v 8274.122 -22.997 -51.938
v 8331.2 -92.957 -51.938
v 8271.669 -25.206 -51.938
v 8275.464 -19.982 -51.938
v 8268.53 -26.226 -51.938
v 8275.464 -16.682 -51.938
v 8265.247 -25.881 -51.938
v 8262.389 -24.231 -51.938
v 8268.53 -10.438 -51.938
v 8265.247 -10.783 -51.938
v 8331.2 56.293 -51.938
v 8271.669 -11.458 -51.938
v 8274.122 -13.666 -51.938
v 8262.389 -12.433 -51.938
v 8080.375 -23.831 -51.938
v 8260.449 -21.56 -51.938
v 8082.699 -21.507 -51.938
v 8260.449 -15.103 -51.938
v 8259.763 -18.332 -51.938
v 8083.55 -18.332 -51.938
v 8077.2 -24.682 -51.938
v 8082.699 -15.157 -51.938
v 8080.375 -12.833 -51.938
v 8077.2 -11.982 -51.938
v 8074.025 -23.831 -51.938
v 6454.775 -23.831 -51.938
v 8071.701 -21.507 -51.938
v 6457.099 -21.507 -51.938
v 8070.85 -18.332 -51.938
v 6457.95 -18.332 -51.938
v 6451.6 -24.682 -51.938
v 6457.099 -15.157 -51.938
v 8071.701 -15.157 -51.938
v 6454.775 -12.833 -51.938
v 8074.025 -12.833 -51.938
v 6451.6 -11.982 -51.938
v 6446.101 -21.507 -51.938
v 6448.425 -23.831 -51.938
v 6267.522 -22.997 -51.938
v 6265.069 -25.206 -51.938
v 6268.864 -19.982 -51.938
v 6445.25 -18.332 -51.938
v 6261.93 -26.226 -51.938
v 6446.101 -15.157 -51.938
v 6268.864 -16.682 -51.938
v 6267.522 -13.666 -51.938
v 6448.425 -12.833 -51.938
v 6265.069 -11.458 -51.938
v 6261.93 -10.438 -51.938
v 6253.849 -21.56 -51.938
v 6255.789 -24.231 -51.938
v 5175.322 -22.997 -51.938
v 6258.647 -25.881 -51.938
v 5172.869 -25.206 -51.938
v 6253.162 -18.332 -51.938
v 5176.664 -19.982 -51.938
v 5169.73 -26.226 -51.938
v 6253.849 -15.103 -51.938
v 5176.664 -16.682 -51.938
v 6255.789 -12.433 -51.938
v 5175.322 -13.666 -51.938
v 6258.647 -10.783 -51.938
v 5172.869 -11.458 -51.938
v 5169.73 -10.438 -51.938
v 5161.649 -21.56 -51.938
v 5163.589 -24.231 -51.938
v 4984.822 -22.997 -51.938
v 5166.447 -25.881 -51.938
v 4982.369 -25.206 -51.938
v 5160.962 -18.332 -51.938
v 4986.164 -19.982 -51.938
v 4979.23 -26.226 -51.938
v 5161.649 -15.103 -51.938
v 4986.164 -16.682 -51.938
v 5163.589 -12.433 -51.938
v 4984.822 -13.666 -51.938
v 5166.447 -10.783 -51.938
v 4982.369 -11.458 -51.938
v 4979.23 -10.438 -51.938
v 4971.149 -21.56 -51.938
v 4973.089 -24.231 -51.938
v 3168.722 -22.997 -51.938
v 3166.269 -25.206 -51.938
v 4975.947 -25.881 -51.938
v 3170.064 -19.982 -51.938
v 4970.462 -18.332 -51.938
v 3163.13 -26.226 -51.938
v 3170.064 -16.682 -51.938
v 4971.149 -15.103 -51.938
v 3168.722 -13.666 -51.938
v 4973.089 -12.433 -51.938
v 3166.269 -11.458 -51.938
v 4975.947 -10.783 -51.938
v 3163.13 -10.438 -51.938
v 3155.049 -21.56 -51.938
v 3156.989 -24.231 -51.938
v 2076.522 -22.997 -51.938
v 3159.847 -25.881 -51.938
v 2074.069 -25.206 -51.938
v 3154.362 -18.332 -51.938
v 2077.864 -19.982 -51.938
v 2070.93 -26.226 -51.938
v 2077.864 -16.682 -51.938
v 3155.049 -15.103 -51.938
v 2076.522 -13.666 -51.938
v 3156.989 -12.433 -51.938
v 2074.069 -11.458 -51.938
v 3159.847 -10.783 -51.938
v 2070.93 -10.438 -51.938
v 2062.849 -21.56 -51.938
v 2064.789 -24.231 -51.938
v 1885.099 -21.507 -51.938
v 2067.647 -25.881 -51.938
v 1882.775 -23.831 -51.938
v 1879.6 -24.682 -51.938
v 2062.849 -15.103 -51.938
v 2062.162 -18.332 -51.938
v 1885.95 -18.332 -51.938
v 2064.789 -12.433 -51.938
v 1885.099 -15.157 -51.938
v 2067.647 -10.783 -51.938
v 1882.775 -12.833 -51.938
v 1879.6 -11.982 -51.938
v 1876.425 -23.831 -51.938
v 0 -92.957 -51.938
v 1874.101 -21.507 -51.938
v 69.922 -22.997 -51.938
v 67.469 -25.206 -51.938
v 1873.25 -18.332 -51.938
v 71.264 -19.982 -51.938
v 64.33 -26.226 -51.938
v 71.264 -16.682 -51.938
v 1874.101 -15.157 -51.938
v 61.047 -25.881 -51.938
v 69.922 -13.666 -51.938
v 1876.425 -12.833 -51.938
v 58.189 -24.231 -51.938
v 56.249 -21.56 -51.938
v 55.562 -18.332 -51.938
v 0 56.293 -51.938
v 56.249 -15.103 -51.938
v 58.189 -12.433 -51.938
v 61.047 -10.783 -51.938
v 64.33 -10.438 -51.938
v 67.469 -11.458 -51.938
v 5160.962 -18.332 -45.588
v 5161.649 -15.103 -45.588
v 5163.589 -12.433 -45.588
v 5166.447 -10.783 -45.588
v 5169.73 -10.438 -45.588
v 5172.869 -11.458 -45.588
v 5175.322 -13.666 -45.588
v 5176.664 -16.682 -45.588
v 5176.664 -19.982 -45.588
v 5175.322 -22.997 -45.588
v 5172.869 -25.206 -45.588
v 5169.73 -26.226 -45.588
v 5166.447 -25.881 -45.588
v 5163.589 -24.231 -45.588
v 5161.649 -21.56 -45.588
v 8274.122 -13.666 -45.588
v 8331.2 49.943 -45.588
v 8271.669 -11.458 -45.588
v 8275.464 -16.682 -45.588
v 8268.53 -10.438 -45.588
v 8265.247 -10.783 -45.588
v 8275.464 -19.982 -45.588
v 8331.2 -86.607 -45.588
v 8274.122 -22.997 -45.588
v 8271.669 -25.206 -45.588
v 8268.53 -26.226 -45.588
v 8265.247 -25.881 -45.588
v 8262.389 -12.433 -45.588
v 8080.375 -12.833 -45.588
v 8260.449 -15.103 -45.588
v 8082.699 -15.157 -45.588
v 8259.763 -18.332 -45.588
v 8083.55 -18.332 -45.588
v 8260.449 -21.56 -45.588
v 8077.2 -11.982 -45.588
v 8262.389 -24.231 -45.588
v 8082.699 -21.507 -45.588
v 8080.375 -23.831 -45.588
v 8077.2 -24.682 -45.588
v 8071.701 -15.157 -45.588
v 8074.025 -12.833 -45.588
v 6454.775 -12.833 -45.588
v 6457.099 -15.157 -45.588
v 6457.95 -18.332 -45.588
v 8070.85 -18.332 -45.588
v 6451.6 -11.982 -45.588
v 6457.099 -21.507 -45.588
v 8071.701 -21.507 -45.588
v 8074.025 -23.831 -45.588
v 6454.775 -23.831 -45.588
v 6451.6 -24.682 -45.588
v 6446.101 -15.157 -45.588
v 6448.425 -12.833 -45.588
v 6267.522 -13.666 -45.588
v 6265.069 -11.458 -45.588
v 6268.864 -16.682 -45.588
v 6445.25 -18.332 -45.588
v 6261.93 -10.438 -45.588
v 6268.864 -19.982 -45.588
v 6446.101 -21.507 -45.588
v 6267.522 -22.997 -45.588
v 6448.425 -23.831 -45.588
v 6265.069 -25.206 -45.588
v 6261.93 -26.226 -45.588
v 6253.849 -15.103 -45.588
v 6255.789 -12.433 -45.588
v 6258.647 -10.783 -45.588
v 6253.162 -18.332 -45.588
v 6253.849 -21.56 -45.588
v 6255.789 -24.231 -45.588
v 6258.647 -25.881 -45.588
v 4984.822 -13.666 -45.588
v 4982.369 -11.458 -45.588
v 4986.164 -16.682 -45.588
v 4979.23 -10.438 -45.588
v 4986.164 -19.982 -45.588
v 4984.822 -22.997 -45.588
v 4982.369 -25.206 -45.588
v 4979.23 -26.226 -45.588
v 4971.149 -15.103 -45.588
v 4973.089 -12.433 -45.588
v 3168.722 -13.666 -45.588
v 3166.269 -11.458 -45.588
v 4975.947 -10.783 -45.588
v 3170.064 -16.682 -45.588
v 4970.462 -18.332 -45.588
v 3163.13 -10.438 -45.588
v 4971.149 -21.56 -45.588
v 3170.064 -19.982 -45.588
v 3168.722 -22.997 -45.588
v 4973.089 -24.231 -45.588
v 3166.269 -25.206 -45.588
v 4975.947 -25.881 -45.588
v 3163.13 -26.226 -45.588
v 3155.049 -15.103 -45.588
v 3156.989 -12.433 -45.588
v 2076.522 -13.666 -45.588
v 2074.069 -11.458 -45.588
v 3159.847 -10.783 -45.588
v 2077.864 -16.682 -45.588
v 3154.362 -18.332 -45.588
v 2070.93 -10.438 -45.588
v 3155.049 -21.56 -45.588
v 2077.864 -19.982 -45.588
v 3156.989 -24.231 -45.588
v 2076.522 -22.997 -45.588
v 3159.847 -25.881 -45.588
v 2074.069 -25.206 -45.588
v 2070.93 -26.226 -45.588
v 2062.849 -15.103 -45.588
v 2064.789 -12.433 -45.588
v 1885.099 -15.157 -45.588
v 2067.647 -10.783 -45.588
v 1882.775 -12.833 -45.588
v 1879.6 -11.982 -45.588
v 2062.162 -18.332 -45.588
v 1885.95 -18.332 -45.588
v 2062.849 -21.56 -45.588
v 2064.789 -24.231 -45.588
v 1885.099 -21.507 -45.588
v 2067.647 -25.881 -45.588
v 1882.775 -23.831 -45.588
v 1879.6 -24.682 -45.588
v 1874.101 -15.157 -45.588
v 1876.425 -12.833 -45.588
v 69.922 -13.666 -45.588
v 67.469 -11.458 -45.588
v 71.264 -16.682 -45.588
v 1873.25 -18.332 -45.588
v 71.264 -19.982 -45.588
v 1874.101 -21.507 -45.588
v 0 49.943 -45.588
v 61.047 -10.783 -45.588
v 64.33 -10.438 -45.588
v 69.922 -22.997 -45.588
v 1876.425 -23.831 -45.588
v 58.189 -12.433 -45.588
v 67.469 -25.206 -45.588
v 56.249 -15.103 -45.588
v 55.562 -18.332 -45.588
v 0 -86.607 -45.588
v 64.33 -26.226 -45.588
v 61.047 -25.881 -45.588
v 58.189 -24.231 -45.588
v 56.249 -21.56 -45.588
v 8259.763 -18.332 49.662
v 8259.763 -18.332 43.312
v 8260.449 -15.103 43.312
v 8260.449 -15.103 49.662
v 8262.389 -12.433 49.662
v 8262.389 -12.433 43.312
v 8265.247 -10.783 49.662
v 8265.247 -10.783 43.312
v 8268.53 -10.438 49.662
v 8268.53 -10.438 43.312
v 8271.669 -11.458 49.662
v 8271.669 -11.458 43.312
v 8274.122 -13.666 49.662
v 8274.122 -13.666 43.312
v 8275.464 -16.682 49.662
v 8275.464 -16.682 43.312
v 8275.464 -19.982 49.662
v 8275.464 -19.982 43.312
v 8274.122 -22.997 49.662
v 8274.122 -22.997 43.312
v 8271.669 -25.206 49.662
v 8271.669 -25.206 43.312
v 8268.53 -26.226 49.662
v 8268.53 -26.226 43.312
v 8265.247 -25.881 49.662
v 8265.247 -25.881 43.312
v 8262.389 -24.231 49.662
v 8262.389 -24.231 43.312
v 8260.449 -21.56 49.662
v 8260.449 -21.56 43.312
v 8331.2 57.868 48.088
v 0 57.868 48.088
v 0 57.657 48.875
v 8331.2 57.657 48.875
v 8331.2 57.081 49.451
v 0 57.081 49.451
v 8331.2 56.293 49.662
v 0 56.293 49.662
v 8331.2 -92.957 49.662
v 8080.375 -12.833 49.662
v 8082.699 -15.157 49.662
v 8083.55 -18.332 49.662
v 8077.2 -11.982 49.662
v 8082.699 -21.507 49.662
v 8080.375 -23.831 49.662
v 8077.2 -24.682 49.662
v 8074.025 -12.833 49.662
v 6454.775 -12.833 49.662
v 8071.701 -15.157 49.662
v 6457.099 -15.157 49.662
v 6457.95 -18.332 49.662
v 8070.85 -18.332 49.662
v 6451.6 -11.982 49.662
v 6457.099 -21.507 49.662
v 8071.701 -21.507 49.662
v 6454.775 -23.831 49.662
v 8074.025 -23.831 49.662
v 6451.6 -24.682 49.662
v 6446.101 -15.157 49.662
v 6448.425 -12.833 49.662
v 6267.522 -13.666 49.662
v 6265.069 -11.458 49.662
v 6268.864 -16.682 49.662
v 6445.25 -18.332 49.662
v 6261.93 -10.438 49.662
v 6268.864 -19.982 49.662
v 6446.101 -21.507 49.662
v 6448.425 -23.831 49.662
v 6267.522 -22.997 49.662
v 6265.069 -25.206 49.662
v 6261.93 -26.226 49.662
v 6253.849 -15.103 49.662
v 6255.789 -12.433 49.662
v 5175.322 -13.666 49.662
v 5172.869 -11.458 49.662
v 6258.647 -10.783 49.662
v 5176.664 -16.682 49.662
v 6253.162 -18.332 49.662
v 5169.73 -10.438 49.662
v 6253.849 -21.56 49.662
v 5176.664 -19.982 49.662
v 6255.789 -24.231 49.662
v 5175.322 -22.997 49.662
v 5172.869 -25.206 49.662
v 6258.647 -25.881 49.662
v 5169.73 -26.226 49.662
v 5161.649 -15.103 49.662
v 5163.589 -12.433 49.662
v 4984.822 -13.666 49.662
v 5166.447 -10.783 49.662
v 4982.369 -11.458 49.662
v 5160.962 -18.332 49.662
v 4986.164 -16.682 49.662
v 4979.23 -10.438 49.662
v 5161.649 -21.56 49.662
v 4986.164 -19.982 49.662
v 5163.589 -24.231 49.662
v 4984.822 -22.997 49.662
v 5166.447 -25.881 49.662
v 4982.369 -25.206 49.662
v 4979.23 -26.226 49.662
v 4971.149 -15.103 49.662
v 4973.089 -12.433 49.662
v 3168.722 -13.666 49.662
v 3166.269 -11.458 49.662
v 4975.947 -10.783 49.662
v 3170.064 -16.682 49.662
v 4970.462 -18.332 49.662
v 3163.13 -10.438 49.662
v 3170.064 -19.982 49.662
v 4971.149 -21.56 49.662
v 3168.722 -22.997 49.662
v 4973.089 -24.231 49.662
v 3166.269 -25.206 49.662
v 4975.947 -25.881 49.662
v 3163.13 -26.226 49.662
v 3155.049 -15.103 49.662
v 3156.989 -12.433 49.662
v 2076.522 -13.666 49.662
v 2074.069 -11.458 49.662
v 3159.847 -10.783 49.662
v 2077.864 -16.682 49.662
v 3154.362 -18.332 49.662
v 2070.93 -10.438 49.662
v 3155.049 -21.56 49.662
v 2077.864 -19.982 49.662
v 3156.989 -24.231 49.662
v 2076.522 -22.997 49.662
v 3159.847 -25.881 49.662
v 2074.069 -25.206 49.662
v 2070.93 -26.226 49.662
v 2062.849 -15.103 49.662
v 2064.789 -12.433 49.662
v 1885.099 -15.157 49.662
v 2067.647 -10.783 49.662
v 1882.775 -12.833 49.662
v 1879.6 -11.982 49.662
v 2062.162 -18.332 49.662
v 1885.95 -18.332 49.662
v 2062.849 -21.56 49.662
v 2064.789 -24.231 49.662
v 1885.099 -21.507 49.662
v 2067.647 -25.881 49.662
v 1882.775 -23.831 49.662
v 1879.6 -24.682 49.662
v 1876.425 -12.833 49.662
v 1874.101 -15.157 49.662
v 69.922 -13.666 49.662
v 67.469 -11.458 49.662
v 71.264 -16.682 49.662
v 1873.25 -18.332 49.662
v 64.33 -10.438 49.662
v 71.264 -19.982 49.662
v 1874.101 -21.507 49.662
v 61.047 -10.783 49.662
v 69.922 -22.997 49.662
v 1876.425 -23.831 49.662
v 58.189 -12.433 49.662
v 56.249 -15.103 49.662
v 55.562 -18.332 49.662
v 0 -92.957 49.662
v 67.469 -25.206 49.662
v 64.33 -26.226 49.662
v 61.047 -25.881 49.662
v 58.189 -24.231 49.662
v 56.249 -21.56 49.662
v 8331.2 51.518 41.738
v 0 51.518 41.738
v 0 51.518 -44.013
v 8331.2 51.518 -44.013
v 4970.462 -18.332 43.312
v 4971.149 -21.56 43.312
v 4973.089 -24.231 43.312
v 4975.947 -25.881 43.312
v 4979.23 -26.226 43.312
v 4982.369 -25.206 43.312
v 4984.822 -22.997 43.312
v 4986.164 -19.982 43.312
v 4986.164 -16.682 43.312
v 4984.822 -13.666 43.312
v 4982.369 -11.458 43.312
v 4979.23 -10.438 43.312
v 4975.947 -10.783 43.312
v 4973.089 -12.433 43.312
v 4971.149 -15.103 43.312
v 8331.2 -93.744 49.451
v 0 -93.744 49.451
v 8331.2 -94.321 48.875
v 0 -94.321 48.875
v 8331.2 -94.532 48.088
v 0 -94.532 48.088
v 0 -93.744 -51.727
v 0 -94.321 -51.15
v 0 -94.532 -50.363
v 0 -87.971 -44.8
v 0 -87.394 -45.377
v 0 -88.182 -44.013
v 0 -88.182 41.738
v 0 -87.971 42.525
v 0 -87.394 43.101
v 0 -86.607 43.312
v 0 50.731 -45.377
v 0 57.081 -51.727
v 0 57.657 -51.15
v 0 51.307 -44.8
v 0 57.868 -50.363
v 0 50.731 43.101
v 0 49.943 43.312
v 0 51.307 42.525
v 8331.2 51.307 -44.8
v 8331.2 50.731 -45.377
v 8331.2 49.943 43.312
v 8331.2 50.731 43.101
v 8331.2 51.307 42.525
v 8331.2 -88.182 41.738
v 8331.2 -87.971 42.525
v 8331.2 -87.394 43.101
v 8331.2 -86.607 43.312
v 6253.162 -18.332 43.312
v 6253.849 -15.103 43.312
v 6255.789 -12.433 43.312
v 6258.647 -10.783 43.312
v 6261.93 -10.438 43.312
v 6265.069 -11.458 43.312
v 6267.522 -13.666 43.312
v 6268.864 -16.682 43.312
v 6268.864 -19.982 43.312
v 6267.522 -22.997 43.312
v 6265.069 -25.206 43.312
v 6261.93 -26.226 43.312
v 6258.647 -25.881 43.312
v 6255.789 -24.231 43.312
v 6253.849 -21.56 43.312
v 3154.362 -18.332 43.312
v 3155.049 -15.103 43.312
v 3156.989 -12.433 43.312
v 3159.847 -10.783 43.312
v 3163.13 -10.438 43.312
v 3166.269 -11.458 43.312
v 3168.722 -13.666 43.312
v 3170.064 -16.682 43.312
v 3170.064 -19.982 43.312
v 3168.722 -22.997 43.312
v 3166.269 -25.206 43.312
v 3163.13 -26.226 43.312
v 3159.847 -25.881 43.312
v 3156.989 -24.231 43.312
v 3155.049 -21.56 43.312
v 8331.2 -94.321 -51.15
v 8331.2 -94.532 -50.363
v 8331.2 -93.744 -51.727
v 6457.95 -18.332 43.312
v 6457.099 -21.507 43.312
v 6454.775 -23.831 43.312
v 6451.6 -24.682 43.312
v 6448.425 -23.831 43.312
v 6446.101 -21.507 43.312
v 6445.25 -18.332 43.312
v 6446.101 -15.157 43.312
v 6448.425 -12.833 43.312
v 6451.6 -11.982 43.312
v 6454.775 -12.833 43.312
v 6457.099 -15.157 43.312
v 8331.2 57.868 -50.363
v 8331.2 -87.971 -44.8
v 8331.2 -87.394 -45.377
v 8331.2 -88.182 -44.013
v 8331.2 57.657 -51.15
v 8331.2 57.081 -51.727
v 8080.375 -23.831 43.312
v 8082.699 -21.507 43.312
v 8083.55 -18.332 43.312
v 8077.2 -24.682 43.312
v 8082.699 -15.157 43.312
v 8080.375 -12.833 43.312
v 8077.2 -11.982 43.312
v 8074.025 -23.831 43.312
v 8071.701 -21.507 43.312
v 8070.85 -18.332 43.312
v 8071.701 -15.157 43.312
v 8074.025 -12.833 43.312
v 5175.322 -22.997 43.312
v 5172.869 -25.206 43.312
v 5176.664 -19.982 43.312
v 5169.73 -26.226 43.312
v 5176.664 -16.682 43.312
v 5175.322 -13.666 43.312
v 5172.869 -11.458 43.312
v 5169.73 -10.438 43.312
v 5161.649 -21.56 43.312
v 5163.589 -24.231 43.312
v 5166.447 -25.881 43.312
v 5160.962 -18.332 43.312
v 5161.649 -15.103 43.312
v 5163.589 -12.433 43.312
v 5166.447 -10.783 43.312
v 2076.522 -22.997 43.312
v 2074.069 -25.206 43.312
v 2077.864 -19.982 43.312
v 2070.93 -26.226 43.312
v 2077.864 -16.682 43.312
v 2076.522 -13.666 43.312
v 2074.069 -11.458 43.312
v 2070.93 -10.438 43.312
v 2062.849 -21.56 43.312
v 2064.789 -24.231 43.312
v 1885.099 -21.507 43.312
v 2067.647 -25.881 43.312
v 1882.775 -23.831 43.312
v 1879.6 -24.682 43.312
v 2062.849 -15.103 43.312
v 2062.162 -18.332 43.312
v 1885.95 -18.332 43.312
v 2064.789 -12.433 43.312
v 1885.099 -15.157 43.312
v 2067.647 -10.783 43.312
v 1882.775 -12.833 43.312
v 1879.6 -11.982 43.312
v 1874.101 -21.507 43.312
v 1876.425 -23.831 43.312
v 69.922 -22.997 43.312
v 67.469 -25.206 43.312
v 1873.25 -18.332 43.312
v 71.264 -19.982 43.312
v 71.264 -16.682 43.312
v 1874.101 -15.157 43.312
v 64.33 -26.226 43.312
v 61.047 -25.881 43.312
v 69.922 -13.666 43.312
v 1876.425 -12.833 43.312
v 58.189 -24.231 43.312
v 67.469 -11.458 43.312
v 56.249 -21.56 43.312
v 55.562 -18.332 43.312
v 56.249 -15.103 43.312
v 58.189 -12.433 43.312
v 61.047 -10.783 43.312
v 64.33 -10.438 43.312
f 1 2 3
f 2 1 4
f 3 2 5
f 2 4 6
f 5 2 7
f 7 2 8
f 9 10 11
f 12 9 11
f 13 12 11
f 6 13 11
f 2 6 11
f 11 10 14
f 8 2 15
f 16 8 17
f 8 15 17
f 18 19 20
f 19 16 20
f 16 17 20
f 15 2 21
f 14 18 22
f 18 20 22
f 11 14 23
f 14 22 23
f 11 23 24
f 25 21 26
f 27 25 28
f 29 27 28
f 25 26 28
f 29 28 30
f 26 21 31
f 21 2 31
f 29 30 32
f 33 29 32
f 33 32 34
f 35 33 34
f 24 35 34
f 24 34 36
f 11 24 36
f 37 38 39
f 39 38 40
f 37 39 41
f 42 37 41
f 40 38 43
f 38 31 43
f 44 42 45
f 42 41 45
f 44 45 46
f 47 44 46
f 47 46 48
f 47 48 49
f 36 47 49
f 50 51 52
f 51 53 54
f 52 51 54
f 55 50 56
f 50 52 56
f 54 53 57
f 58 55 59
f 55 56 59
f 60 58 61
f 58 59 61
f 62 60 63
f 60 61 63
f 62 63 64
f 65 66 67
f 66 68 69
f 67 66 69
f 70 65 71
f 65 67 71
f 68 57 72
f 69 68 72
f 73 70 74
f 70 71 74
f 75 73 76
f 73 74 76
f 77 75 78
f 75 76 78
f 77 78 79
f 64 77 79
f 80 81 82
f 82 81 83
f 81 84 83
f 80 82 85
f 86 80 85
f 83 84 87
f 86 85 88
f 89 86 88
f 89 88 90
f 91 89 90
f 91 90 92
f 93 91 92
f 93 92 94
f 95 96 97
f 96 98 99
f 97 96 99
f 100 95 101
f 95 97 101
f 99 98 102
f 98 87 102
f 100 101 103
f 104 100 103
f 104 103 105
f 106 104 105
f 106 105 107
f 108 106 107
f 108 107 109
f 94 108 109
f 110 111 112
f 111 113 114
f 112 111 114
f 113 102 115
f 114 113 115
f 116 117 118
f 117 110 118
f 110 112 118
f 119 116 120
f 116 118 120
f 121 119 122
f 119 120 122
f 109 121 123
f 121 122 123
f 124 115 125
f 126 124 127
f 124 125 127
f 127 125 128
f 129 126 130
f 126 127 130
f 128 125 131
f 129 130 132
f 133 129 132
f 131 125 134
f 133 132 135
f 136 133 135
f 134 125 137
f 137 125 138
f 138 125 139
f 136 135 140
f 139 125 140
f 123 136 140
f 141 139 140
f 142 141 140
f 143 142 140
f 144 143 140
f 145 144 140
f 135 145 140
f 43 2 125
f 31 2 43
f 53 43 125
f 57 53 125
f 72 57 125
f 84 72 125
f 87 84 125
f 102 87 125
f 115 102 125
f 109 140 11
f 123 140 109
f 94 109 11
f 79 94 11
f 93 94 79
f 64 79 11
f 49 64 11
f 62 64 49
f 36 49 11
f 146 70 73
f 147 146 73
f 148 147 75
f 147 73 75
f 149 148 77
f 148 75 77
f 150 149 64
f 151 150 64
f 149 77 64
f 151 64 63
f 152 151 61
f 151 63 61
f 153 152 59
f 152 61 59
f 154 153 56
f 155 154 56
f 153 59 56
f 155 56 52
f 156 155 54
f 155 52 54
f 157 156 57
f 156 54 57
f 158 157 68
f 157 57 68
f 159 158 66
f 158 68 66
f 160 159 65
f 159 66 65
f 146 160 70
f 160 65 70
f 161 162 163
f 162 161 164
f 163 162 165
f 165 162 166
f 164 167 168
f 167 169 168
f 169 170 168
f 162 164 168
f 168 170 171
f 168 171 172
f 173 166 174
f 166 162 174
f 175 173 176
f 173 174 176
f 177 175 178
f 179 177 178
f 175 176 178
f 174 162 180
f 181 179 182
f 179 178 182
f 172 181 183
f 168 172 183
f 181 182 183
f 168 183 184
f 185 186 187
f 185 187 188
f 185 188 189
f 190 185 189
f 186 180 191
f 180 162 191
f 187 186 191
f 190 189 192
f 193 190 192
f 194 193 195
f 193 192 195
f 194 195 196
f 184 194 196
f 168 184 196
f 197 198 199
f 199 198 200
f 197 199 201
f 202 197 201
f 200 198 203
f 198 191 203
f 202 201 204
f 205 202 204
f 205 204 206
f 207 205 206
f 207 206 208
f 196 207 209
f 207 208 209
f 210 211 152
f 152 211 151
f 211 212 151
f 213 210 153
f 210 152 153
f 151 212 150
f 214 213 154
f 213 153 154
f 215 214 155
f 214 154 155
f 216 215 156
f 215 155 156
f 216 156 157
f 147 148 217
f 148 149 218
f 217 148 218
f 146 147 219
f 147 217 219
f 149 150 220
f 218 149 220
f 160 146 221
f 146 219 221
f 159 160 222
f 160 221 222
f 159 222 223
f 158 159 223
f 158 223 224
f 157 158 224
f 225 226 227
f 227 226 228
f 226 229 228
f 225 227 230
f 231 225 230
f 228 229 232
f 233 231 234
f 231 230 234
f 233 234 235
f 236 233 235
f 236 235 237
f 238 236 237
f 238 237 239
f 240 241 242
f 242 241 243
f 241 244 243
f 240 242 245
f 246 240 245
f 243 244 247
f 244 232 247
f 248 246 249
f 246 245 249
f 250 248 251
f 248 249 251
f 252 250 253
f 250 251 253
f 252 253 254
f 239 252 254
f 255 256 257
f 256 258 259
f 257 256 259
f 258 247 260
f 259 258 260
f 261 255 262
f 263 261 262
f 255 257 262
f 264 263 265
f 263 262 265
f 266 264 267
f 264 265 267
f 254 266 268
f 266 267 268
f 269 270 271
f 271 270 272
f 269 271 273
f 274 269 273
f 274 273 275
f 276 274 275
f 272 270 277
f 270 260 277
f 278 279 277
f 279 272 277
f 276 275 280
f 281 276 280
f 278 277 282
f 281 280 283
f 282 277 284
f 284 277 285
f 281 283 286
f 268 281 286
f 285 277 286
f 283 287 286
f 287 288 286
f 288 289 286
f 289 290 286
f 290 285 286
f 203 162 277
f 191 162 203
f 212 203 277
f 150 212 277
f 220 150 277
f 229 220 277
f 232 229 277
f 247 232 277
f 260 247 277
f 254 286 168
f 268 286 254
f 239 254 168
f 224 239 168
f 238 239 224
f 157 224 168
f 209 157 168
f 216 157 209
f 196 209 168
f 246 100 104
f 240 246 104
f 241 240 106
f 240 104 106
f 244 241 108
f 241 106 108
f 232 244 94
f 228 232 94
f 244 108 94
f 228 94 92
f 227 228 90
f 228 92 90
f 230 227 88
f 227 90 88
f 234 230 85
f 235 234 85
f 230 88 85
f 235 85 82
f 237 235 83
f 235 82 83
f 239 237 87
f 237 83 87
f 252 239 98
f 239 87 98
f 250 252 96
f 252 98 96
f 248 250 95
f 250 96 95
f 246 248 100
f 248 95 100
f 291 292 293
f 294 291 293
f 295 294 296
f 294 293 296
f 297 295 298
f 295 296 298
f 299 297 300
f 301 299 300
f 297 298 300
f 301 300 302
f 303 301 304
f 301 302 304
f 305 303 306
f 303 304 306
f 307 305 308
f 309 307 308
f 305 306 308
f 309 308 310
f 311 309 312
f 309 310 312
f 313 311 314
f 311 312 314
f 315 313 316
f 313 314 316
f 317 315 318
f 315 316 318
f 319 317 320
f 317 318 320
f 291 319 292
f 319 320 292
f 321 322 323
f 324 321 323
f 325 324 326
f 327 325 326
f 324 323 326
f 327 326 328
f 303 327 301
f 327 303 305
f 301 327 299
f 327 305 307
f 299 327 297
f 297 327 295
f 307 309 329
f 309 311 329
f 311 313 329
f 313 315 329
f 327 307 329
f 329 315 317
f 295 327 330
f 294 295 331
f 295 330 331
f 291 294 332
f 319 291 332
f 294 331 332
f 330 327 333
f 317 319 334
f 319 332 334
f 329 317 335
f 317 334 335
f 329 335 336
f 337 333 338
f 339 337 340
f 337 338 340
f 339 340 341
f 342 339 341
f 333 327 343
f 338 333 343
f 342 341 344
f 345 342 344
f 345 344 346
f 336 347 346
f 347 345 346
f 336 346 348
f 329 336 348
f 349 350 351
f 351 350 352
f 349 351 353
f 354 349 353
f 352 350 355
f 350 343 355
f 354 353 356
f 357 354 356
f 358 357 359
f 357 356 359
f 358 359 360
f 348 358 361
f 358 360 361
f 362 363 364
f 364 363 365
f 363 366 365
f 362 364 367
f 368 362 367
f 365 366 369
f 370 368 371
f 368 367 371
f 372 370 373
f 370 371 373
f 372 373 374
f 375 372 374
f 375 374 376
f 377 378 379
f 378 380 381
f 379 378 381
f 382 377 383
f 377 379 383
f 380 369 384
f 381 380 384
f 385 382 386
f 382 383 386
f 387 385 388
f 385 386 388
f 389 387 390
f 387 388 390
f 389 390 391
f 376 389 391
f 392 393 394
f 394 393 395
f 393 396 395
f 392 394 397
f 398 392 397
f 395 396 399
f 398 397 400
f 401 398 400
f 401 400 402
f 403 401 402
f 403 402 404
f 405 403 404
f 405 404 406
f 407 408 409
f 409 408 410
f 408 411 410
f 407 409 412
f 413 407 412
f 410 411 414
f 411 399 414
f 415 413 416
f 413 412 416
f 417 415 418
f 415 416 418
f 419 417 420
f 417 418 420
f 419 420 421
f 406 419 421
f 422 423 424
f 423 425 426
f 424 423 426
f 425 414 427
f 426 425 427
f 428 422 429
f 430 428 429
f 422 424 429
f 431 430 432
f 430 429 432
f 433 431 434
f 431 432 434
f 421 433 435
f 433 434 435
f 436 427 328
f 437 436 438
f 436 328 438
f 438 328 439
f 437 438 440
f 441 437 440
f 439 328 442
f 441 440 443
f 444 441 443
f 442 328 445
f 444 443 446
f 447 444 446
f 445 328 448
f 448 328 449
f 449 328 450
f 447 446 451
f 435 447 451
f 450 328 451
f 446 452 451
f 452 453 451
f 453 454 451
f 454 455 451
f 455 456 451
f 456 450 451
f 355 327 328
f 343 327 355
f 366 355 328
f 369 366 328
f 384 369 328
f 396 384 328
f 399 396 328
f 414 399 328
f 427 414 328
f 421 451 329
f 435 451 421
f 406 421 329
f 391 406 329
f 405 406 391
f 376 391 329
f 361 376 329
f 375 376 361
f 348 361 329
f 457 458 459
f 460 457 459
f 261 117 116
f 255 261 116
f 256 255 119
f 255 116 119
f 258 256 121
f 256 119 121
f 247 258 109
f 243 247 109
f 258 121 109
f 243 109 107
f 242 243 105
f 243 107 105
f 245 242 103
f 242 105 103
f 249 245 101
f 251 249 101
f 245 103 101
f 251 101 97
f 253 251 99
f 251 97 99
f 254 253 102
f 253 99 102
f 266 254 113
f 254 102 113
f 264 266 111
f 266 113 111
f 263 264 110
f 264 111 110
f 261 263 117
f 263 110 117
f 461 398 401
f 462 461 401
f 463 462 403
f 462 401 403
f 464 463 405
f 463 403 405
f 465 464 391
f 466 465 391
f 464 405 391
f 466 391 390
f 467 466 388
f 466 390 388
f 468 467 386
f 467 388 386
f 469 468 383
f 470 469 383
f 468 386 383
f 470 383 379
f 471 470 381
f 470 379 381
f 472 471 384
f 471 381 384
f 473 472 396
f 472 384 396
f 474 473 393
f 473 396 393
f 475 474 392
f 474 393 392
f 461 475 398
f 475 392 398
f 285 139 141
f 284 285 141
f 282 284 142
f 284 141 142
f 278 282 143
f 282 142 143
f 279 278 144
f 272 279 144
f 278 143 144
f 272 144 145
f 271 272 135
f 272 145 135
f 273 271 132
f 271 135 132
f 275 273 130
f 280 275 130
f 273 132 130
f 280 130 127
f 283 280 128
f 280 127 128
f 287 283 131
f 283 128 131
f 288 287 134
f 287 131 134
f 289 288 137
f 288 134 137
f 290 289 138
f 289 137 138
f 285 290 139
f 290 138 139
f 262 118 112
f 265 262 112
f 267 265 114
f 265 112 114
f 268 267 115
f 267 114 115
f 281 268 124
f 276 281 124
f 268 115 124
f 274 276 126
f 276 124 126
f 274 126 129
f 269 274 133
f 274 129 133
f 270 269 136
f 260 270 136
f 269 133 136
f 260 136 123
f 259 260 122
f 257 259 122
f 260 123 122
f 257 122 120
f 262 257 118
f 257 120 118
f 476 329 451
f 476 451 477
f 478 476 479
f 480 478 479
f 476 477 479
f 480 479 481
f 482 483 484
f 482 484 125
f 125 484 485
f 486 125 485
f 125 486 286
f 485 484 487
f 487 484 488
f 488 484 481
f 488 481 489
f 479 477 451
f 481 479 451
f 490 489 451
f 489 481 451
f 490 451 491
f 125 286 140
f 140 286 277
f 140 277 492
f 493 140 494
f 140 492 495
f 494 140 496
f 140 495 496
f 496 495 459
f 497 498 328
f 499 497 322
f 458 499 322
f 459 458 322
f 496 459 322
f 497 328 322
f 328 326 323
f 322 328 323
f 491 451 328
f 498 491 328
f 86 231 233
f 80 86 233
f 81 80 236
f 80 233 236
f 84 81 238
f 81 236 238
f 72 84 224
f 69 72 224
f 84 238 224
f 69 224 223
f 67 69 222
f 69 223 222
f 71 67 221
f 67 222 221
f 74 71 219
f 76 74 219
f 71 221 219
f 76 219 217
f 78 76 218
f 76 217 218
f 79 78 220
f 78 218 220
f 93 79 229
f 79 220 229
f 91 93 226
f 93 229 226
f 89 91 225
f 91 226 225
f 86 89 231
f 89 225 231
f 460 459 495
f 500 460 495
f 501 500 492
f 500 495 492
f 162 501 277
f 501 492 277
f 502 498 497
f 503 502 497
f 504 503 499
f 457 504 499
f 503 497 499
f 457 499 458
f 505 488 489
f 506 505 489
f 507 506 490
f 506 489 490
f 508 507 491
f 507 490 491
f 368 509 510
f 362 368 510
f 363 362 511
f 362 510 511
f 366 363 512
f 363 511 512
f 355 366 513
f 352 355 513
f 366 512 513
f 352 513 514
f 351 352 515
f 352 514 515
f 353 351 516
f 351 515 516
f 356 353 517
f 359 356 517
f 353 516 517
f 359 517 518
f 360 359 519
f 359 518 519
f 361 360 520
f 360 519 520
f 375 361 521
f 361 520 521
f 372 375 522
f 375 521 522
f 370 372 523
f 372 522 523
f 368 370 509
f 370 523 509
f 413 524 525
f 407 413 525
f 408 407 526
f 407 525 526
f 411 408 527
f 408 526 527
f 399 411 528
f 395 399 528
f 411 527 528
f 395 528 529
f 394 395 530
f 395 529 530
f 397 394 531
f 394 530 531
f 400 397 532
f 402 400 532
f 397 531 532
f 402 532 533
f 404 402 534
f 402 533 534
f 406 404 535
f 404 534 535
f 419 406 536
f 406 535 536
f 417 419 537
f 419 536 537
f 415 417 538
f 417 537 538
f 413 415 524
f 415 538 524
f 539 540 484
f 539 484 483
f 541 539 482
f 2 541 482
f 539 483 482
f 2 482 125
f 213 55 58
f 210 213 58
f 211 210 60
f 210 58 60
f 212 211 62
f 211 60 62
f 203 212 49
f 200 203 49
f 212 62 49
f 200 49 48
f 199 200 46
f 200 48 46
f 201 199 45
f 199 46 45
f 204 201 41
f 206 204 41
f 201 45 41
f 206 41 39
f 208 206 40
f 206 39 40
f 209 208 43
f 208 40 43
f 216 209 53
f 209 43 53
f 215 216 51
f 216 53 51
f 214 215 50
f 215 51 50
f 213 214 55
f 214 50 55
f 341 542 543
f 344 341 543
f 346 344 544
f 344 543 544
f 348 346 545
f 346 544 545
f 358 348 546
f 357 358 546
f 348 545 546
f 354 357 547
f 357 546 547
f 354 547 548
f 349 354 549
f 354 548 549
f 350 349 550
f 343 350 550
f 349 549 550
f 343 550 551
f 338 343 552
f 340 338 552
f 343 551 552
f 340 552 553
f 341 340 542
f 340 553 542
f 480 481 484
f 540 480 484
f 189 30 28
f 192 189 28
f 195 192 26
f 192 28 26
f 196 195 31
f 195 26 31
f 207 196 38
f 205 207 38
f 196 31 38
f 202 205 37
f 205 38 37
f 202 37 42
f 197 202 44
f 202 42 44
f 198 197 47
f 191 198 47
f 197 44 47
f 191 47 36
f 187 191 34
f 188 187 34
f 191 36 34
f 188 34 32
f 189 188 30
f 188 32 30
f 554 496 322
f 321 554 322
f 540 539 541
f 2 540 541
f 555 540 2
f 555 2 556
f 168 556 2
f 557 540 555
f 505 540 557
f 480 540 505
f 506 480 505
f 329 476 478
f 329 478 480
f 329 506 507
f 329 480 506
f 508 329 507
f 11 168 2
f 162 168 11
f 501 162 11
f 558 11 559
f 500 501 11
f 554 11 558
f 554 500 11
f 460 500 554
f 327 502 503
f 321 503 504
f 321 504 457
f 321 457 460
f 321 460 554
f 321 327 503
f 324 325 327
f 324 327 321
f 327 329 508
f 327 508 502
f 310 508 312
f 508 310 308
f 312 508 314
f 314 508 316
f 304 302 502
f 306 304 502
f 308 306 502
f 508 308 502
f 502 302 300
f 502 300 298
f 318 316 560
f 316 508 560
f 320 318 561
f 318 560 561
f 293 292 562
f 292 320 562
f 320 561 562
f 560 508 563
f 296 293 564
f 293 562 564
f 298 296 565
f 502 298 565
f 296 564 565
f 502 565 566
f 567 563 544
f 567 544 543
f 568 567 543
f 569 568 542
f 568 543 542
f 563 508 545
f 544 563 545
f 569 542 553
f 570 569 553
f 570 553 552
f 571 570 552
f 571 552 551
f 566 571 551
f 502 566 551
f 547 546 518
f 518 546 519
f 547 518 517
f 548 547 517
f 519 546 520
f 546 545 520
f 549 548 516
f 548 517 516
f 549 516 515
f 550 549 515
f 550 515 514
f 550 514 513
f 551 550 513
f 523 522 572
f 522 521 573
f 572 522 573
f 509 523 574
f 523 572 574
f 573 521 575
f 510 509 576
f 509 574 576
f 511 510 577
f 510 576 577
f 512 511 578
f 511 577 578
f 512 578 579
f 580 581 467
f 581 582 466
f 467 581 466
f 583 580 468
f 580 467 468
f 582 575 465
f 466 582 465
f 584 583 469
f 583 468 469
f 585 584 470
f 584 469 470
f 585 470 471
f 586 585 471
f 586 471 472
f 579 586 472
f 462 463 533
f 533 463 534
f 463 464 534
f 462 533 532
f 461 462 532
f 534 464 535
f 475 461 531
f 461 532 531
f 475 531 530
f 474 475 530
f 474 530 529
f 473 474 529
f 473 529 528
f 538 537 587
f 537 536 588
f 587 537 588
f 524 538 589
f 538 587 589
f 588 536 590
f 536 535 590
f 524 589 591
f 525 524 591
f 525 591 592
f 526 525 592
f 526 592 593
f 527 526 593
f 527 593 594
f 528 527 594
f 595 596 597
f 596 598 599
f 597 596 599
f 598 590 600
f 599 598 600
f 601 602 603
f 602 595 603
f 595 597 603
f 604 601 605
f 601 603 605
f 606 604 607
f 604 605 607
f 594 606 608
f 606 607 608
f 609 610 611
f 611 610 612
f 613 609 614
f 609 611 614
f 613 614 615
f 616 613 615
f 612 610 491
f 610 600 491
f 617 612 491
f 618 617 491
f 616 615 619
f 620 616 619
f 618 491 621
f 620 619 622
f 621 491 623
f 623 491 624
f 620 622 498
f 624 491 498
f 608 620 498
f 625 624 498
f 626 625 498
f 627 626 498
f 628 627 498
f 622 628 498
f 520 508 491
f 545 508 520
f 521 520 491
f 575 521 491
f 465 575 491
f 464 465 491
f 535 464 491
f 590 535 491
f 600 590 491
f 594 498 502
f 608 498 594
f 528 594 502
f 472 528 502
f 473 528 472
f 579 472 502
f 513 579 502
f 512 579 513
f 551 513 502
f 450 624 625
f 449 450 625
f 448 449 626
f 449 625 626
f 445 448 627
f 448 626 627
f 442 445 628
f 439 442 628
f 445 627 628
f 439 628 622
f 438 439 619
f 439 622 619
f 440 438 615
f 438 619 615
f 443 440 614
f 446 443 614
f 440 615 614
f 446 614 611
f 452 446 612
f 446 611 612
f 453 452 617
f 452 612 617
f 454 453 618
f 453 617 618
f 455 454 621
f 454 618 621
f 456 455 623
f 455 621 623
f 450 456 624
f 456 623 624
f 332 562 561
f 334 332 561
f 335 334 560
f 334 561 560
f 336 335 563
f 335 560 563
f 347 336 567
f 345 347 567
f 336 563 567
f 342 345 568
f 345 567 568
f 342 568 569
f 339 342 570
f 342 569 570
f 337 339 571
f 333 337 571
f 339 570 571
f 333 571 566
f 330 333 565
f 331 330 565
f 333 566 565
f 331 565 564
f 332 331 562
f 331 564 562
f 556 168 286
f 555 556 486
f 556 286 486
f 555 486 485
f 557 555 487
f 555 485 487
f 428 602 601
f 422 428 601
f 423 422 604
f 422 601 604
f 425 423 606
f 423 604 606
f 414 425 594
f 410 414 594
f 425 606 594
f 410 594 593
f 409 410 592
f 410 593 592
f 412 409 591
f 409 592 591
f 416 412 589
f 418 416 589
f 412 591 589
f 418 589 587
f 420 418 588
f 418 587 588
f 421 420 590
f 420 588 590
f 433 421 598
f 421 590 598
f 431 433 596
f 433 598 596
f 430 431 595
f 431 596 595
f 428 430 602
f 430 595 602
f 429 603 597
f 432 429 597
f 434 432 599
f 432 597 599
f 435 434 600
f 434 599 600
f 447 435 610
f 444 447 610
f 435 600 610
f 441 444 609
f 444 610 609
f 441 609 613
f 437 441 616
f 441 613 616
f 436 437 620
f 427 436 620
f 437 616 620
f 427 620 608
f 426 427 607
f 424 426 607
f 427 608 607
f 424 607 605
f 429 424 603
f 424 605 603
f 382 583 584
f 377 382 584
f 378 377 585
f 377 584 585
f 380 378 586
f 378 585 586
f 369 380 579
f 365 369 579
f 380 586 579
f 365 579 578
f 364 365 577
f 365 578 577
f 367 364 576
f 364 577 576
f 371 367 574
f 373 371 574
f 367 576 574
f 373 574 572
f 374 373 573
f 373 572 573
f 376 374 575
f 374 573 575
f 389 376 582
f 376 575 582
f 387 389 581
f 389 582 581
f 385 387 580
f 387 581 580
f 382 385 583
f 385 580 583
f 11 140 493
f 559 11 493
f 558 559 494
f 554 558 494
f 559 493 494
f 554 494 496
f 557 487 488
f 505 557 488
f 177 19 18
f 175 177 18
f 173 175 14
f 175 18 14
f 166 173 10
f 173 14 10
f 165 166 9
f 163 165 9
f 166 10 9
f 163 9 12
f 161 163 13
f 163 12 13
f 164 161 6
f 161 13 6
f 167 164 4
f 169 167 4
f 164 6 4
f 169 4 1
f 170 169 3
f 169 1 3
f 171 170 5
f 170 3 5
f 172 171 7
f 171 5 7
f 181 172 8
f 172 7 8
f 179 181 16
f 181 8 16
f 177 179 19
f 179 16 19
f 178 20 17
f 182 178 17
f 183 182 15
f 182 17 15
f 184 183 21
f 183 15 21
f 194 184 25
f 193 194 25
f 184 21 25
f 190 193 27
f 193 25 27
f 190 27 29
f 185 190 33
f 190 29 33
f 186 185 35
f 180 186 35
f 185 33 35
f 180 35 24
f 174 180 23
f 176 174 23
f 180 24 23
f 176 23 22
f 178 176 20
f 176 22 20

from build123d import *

# Parameters (mm, degrees)
F1_DEPTH   = 8331.2
F2_R       = 6.35
F3_DEPTH   = 101.601
F5_D       = 15.875
F5_ON_F2_D = 15.875


with BuildPart() as f1:
    # F0 (on Right) → F1 (new body)
    with BuildSketch(Plane.YZ):
        with BuildLine():
            Line((-92.9570702586, -51.9375825852), (56.2933297414, -51.9375825852))
            ThreePointArc((56.2933297414, -51.9375825852), (57.4068815005, -51.4763343442), (57.8681297414, -50.3627825852))
            Line((57.8681297414, -50.3627825852), (57.8681297414, 48.0876174148))
            ThreePointArc((57.8681297414, 48.0876174148), (57.4068815005, 49.2011691738), (56.2933297414, 49.6624174148))
            Line((56.2933297414, 49.6624174148), (-92.9570702586, 49.6624174148))
            ThreePointArc((-92.9570702586, 49.6624174148), (-94.0706220176, 49.2011691738), (-94.5318702586, 48.0876174148))
            Line((-94.5318702586, 48.0876174148), (-94.5318702586, -50.3627825852))
            ThreePointArc((-94.5318702586, -50.3627825852), (-94.0706220176, -51.4763343442), (-92.9570702586, -51.9375825852))
        make_face()
        with BuildLine():
            ThreePointArc((-88.1818702586, 41.7376174148), (-87.7206220176, 42.8511691738), (-86.6070702586, 43.3124174148))
            Line((-86.6070702586, 43.3124174148), (49.9433297414, 43.3124174148))
            ThreePointArc((49.9433297414, 43.3124174148), (51.0568815005, 42.8511691738), (51.5181297414, 41.7376174148))
            Line((51.5181297414, 41.7376174148), (51.5181297414, -44.0127825852))
            ThreePointArc((51.5181297414, -44.0127825852), (51.0568815005, -45.1263343442), (49.9433297414, -45.5875825852))
            Line((49.9433297414, -45.5875825852), (-86.6070702586, -45.5875825852))
            ThreePointArc((-86.6070702586, -45.5875825852), (-87.7206220176, -45.1263343442), (-88.1818702586, -44.0127825852))
            Line((-88.1818702586, -44.0127825852), (-88.1818702586, 41.7376174148))
        make_face(mode=Mode.SUBTRACT)
    extrude(amount=F1_DEPTH)

    # F2 (on face) → F3 (cut, through all)
    with BuildSketch(Plane(origin=(0, 0, -51.9375825852), x_dir=(1, 0, 0), z_dir=(0, 0, -1))):
        with Locations((8077.2, 18.3318702586)):
            Circle(F2_R)
        with Locations((6451.6, 18.3318702586)):
            Circle(F2_R)
        with Locations((1879.6, 18.3318702586)):
            Circle(F2_R)
    extrude(amount=-F3_DEPTH, mode=Mode.SUBTRACT)

    # F5 (through all)
    with Locations(Plane.XY.offset(49.6624174148)):
        with Locations((6261.1, -18.3318702586), (8267.7, -18.3318702586), (3162.3, -18.3318702586), (2070.1, -18.3318702586), (63.5, -18.3318702586), (5168.9, -18.3318702586)):
            Hole(F5_D / 2)

    # F5 on F2 (through all)
    with Locations(Plane(origin=(0, 0, -51.9375825852), x_dir=(1, 0, 0), z_dir=(0, 0, -1))):
        with Locations((4978.4, 18.3318702586)):
            Hole(F5_ON_F2_D / 2)


solid = f1.part
